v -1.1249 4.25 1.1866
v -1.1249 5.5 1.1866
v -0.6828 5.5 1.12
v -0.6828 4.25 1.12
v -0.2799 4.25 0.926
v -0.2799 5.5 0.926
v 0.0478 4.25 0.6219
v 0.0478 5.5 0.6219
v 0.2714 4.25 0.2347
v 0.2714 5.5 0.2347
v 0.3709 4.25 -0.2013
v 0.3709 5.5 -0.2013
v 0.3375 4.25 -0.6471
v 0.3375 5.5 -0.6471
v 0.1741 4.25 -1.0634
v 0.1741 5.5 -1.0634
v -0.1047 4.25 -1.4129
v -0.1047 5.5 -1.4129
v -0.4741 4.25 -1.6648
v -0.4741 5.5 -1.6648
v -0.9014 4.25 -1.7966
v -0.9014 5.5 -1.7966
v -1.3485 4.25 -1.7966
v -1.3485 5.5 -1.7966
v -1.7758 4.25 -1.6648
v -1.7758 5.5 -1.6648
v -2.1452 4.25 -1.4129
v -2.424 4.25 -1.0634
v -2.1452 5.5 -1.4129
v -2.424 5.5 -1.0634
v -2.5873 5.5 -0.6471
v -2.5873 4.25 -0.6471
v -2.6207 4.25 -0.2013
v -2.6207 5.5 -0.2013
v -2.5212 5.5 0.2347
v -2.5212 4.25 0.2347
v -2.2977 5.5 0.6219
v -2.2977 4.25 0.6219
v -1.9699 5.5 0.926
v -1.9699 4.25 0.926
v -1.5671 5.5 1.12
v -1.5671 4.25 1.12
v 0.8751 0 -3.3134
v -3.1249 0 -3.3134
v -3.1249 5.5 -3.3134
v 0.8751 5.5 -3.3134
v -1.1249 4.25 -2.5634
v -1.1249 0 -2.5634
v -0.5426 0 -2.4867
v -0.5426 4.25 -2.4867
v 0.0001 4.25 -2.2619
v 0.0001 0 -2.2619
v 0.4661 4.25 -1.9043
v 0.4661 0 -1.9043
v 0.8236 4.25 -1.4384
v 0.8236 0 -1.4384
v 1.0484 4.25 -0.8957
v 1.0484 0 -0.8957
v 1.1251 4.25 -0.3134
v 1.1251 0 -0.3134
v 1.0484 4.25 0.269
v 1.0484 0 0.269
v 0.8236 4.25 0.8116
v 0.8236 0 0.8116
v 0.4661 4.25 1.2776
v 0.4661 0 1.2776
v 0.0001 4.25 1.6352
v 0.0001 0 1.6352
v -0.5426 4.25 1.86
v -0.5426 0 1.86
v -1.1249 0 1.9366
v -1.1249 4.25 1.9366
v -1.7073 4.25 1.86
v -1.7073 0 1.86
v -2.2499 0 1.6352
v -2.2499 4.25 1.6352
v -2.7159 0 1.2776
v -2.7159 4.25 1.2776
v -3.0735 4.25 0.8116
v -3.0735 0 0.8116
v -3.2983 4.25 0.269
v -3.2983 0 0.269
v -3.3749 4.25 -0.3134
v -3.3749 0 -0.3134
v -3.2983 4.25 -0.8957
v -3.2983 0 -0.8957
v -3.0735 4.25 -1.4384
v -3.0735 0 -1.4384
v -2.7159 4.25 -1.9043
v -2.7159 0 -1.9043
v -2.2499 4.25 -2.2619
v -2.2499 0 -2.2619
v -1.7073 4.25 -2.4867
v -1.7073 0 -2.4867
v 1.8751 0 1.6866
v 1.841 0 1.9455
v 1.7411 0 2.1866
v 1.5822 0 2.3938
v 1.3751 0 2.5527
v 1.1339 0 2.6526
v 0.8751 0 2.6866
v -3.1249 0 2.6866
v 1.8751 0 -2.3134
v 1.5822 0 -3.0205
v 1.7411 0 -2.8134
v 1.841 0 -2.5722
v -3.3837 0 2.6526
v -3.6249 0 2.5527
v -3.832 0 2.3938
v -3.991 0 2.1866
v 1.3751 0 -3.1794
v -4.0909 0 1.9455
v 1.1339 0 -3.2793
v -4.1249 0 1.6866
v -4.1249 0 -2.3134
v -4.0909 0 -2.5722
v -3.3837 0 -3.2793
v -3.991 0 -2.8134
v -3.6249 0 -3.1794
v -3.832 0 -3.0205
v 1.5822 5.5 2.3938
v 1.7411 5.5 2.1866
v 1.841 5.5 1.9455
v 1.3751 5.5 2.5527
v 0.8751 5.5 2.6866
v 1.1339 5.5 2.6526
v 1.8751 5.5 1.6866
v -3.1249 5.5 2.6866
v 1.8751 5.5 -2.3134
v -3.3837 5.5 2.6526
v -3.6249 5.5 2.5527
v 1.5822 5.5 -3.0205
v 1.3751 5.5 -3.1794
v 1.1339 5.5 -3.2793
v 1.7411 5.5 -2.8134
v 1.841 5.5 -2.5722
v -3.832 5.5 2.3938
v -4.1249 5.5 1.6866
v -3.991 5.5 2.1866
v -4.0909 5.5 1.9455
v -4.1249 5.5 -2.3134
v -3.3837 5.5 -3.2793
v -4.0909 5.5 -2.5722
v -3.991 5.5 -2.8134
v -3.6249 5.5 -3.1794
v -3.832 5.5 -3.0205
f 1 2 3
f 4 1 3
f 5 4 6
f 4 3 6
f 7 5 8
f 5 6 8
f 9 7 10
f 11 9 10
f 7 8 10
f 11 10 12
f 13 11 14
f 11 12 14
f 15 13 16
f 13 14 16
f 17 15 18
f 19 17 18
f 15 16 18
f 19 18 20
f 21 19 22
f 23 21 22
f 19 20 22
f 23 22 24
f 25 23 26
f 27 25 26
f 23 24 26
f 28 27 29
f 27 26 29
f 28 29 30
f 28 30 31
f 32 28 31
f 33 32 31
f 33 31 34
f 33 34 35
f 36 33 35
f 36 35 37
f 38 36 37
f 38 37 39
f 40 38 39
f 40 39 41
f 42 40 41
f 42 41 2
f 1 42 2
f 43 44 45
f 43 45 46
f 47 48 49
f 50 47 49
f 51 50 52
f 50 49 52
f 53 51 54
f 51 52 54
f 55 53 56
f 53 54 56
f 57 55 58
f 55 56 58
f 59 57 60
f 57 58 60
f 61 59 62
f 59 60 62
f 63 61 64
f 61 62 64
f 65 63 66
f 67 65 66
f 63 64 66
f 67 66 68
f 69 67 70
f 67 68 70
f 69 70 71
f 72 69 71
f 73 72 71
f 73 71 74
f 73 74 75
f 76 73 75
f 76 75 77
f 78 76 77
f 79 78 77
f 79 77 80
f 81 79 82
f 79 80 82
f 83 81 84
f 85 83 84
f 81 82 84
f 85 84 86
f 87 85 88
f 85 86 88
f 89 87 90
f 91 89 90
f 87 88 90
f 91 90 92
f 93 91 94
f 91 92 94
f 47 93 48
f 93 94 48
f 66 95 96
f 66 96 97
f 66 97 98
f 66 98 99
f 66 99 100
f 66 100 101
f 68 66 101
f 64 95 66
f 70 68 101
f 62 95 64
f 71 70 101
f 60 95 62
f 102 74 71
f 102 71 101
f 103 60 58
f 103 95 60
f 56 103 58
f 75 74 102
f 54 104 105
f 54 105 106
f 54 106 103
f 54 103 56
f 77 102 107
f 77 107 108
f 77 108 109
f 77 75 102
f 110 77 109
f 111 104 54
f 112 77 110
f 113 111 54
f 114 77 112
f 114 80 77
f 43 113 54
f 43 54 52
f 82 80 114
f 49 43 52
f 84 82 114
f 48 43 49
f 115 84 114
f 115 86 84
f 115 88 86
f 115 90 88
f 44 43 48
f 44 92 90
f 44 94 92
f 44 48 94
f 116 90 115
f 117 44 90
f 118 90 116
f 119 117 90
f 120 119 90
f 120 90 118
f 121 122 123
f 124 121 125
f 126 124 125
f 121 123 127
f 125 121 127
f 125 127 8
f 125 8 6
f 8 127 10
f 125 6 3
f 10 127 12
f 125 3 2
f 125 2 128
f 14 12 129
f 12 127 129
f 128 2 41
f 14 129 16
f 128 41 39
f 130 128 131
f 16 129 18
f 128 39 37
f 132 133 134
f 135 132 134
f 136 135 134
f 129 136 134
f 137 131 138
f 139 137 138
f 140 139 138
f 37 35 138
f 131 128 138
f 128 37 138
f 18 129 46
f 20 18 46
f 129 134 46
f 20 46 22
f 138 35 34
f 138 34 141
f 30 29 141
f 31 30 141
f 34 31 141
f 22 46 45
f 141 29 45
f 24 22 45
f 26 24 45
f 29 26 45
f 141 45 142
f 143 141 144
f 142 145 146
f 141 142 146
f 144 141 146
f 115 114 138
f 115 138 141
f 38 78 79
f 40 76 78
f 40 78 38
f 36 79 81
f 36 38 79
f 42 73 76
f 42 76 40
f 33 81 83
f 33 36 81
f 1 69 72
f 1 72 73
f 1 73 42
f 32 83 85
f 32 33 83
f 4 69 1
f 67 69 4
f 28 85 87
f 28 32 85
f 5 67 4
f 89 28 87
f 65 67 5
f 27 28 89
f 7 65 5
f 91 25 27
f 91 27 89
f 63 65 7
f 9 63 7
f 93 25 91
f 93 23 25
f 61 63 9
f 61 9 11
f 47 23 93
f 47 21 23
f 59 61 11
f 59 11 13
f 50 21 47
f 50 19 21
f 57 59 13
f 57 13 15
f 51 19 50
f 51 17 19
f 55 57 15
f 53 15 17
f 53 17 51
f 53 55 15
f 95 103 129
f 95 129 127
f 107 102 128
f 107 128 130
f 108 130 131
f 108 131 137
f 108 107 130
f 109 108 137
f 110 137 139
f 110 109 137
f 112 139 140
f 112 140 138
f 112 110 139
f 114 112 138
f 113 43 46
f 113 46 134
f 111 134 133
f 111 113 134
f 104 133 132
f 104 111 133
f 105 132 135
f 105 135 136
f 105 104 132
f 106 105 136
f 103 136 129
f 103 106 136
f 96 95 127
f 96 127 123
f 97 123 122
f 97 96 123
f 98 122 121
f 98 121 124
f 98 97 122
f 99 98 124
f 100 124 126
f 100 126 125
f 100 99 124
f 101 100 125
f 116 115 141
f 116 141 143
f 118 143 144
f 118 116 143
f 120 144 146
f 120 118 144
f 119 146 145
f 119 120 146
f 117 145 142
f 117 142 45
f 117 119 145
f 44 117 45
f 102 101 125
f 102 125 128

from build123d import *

# Parameters (mm, degrees)
BOSS_EXTRUDE1_DEPTH = 5.5
SKETCH2_R           = 1.5
CUT_EXTRUDE1_DEPTH  = 5.5
SKETCH3_R           = 2.25
CUT_EXTRUDE2_DEPTH  = 4.25


with BuildPart() as part:
    # Sketch1 → Boss-Extrude1 (new body)
    with BuildSketch(Plane(origin=(0, 0, 0), x_dir=(1, 0, 0), z_dir=(0, 1, 0))):
        with BuildLine():
            Line((-3.124927795, 3.313350367), (0.875072205, 3.313350367))
            ThreePointArc((0.875072205, 3.313350367), (1.582178986, 3.020457148), (1.875072205, 2.313350367))
            Line((1.875072205, 2.313350367), (1.875072205, -1.686649633))
            ThreePointArc((1.875072205, -1.686649633), (1.582178986, -2.393756414), (0.875072205, -2.686649633))
            Line((0.875072205, -2.686649633), (-3.124927795, -2.686649633))
            ThreePointArc((-3.124927795, -2.686649633), (-3.832034576, -2.393756414), (-4.124927795, -1.686649633))
            Line((-4.124927795, -1.686649633), (-4.124927795, 2.313350367))
            ThreePointArc((-4.124927795, 2.313350367), (-3.832034576, 3.020457148), (-3.124927795, 3.313350367))
        make_face()
    extrude(amount=BOSS_EXTRUDE1_DEPTH)

    # Sketch2 → Cut-Extrude1 (cut)
    with BuildSketch(Plane(origin=(0, 5.5, 0), x_dir=(1, 0, 0), z_dir=(0, 1, 0))):
        with Locations(Location((-1.124927795, 0.313350367, 0), (0, 0, 270))):
            Circle(SKETCH2_R)
    extrude(amount=-CUT_EXTRUDE1_DEPTH, mode=Mode.SUBTRACT)

    # Sketch3 → Cut-Extrude2 (cut)
    with BuildSketch(Plane.XZ):
        with Locations(Location((-1.124927795, -0.313350367, 0), (0, 0, 270))):
            Circle(SKETCH3_R)
    extrude(amount=-CUT_EXTRUDE2_DEPTH, mode=Mode.SUBTRACT)


solid = part.part
